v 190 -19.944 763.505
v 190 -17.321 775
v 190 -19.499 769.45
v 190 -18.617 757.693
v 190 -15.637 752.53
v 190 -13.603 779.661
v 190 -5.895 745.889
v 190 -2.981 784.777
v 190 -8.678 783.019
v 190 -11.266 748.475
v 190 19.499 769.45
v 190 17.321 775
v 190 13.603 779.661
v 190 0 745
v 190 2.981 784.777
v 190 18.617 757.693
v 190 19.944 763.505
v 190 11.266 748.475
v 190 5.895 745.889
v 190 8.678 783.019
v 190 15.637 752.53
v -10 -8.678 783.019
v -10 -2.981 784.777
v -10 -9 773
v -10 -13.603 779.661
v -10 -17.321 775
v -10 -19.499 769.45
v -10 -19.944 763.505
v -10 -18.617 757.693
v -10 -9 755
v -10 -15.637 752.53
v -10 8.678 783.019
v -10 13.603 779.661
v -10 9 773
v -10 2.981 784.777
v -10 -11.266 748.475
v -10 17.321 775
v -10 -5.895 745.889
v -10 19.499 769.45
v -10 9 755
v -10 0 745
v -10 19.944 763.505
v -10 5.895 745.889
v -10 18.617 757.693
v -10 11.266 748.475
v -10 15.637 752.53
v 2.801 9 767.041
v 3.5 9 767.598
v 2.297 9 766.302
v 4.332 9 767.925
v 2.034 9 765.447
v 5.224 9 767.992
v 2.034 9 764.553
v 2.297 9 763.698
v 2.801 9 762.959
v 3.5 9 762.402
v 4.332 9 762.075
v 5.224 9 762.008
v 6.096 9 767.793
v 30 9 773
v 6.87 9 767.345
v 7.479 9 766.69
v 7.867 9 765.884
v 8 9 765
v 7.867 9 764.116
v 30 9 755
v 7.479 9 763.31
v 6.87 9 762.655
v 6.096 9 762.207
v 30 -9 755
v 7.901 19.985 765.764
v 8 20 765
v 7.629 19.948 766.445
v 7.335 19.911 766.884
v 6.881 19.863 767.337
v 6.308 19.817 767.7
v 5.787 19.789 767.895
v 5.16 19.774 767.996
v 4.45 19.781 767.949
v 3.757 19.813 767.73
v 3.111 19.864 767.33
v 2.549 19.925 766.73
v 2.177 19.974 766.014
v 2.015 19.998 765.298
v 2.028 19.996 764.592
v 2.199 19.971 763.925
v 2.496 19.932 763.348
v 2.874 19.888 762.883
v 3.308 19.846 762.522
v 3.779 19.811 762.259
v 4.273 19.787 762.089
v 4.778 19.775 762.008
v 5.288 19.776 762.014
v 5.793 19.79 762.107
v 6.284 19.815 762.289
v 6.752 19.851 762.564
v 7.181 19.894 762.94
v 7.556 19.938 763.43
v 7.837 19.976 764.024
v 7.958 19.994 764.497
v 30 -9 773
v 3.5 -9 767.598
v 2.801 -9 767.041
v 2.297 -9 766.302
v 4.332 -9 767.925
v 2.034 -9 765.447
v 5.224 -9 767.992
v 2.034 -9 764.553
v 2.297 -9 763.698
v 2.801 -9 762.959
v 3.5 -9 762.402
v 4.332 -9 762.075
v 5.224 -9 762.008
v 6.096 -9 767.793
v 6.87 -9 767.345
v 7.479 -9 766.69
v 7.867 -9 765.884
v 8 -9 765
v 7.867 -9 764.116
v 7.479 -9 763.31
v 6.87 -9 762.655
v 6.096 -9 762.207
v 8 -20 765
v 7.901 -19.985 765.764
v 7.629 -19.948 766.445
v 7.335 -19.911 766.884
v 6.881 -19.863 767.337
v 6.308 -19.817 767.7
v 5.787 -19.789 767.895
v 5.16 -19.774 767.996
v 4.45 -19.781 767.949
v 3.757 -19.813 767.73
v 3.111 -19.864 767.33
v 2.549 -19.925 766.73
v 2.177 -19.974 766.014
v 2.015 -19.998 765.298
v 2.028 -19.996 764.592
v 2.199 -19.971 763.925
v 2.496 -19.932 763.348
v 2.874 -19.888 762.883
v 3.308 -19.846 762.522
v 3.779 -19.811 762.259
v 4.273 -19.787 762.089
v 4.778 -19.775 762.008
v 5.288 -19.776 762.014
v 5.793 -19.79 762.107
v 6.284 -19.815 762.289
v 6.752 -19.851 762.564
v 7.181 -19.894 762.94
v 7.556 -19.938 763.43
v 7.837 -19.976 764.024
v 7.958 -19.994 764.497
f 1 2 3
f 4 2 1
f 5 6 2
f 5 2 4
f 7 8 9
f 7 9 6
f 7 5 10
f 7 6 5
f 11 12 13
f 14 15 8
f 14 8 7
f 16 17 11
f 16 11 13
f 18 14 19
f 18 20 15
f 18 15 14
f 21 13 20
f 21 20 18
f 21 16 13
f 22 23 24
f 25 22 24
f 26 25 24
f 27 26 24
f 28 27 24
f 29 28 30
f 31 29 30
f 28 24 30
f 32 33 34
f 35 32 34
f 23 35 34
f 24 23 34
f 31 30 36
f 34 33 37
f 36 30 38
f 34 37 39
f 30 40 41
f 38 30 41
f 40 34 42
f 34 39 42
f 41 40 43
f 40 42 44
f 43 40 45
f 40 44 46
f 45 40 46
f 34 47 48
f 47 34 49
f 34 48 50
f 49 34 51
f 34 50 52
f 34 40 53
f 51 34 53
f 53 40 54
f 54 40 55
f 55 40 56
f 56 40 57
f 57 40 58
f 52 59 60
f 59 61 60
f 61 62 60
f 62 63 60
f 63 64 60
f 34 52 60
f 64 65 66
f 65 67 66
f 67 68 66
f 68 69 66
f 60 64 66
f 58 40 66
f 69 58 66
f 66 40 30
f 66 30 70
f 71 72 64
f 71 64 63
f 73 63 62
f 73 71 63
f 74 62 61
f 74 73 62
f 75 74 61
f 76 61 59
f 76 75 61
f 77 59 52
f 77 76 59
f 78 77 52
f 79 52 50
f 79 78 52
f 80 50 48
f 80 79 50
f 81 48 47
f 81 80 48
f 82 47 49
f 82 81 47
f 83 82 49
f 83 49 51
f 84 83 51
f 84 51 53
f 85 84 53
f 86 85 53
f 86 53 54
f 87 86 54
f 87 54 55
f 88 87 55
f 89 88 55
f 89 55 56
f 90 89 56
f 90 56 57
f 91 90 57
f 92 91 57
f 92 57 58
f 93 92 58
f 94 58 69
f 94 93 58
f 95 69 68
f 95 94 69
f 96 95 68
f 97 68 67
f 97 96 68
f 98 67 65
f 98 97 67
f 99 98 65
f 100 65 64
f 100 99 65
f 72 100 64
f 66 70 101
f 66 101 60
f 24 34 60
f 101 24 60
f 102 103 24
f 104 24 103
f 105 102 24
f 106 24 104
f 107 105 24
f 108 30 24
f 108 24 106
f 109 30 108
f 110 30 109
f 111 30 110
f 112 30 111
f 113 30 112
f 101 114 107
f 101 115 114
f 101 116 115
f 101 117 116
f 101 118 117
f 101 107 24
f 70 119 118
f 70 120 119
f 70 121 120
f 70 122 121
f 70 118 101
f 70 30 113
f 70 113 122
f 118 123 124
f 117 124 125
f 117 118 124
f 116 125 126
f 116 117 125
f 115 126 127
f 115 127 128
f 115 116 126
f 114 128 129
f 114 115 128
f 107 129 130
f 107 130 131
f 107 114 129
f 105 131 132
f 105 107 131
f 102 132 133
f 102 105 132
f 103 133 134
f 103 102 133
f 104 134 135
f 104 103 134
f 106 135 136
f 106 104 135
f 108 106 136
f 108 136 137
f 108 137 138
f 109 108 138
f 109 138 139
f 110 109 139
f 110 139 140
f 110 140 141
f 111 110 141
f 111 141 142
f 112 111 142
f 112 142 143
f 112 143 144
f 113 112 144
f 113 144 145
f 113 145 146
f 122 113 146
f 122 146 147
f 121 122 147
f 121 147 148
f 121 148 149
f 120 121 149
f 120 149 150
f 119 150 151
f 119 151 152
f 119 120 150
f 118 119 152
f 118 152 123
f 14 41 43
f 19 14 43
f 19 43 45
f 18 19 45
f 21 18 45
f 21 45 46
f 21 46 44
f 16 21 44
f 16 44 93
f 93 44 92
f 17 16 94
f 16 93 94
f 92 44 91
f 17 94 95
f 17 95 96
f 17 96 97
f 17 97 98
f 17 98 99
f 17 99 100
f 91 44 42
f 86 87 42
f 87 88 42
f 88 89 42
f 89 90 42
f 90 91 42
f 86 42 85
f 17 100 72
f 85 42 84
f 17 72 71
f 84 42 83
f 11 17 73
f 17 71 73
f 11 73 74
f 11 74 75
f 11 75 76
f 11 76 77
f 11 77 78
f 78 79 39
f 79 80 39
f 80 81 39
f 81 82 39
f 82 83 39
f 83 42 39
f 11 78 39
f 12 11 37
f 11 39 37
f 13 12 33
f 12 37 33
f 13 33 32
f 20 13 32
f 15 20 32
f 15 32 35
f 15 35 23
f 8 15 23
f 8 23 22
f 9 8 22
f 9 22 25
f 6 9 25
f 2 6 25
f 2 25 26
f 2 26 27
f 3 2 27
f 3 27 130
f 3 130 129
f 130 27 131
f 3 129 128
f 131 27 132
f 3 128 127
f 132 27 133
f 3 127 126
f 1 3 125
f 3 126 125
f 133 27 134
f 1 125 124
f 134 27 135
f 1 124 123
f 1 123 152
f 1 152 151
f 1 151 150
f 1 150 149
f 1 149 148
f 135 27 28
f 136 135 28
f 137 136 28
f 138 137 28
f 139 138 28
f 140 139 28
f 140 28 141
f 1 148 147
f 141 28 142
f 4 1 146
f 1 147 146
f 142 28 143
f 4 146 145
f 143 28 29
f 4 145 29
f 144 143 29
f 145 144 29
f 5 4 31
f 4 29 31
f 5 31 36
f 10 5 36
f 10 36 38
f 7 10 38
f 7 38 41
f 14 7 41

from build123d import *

# Parameters (mm, degrees)
CYLINDER137_R          = 3
CYLINDER137_DEPTH      = 60
CYLINDER137_ROLL_ANGLE = 90
BOX079_W               = 40
BOX079_H               = 18
BOX079_DEPTH           = 18
CYLINDER_R             = 20
CYLINDER_DEPTH         = 200
CYLINDER_PITCH_ANGLE   = 90


with BuildPart() as cilindro091:
    # Cylinder137 → Cylinder137 (new body)
    with BuildSketch(Plane.XY):
        Circle(CYLINDER137_R)
    extrude(amount=CYLINDER137_DEPTH)


with BuildPart() as cilindro091_1:
    # Cylinder137 roll: moved
    add(cilindro091.part.rotate(Axis((0, 0, 0), (1, 0, 0)), CYLINDER137_ROLL_ANGLE))


with BuildPart() as cilindro091_2:
    # Cylinder137 placement: moved
    add(cilindro091_1.part.moved(Location((5, 37, 765))))


with BuildPart() as cubo056:
    # Box079 → Box079 (new body)
    with BuildSketch(Plane(origin=(-10, -9, 755), x_dir=(1, 0, 0), z_dir=(0, 0, 1))):
        with Locations((20, 9)):
            Rectangle(BOX079_W, BOX079_H)
    extrude(amount=BOX079_DEPTH)


with BuildPart() as cut144:
    # Cylinder → Cylinder (new body)
    with BuildSketch(Plane.XY):
        Circle(CYLINDER_R)
    extrude(amount=CYLINDER_DEPTH)


with BuildPart() as cut144_1:
    # Cylinder pitch: moved
    add(cut144.part.rotate(Axis((0, 0, 0), (0, 1, 0)), CYLINDER_PITCH_ANGLE))


with BuildPart() as cut144_2:
    # Cylinder placement: moved
    add(cut144_1.part.moved(Location((-10, 0, 765))))

    # Cut143: cut Cubo056
    add(cubo056.part, mode=Mode.SUBTRACT)

    # Cut144: cut Cilindro091
    add(cilindro091_2.part, mode=Mode.SUBTRACT)


solid = cut144_2.part
